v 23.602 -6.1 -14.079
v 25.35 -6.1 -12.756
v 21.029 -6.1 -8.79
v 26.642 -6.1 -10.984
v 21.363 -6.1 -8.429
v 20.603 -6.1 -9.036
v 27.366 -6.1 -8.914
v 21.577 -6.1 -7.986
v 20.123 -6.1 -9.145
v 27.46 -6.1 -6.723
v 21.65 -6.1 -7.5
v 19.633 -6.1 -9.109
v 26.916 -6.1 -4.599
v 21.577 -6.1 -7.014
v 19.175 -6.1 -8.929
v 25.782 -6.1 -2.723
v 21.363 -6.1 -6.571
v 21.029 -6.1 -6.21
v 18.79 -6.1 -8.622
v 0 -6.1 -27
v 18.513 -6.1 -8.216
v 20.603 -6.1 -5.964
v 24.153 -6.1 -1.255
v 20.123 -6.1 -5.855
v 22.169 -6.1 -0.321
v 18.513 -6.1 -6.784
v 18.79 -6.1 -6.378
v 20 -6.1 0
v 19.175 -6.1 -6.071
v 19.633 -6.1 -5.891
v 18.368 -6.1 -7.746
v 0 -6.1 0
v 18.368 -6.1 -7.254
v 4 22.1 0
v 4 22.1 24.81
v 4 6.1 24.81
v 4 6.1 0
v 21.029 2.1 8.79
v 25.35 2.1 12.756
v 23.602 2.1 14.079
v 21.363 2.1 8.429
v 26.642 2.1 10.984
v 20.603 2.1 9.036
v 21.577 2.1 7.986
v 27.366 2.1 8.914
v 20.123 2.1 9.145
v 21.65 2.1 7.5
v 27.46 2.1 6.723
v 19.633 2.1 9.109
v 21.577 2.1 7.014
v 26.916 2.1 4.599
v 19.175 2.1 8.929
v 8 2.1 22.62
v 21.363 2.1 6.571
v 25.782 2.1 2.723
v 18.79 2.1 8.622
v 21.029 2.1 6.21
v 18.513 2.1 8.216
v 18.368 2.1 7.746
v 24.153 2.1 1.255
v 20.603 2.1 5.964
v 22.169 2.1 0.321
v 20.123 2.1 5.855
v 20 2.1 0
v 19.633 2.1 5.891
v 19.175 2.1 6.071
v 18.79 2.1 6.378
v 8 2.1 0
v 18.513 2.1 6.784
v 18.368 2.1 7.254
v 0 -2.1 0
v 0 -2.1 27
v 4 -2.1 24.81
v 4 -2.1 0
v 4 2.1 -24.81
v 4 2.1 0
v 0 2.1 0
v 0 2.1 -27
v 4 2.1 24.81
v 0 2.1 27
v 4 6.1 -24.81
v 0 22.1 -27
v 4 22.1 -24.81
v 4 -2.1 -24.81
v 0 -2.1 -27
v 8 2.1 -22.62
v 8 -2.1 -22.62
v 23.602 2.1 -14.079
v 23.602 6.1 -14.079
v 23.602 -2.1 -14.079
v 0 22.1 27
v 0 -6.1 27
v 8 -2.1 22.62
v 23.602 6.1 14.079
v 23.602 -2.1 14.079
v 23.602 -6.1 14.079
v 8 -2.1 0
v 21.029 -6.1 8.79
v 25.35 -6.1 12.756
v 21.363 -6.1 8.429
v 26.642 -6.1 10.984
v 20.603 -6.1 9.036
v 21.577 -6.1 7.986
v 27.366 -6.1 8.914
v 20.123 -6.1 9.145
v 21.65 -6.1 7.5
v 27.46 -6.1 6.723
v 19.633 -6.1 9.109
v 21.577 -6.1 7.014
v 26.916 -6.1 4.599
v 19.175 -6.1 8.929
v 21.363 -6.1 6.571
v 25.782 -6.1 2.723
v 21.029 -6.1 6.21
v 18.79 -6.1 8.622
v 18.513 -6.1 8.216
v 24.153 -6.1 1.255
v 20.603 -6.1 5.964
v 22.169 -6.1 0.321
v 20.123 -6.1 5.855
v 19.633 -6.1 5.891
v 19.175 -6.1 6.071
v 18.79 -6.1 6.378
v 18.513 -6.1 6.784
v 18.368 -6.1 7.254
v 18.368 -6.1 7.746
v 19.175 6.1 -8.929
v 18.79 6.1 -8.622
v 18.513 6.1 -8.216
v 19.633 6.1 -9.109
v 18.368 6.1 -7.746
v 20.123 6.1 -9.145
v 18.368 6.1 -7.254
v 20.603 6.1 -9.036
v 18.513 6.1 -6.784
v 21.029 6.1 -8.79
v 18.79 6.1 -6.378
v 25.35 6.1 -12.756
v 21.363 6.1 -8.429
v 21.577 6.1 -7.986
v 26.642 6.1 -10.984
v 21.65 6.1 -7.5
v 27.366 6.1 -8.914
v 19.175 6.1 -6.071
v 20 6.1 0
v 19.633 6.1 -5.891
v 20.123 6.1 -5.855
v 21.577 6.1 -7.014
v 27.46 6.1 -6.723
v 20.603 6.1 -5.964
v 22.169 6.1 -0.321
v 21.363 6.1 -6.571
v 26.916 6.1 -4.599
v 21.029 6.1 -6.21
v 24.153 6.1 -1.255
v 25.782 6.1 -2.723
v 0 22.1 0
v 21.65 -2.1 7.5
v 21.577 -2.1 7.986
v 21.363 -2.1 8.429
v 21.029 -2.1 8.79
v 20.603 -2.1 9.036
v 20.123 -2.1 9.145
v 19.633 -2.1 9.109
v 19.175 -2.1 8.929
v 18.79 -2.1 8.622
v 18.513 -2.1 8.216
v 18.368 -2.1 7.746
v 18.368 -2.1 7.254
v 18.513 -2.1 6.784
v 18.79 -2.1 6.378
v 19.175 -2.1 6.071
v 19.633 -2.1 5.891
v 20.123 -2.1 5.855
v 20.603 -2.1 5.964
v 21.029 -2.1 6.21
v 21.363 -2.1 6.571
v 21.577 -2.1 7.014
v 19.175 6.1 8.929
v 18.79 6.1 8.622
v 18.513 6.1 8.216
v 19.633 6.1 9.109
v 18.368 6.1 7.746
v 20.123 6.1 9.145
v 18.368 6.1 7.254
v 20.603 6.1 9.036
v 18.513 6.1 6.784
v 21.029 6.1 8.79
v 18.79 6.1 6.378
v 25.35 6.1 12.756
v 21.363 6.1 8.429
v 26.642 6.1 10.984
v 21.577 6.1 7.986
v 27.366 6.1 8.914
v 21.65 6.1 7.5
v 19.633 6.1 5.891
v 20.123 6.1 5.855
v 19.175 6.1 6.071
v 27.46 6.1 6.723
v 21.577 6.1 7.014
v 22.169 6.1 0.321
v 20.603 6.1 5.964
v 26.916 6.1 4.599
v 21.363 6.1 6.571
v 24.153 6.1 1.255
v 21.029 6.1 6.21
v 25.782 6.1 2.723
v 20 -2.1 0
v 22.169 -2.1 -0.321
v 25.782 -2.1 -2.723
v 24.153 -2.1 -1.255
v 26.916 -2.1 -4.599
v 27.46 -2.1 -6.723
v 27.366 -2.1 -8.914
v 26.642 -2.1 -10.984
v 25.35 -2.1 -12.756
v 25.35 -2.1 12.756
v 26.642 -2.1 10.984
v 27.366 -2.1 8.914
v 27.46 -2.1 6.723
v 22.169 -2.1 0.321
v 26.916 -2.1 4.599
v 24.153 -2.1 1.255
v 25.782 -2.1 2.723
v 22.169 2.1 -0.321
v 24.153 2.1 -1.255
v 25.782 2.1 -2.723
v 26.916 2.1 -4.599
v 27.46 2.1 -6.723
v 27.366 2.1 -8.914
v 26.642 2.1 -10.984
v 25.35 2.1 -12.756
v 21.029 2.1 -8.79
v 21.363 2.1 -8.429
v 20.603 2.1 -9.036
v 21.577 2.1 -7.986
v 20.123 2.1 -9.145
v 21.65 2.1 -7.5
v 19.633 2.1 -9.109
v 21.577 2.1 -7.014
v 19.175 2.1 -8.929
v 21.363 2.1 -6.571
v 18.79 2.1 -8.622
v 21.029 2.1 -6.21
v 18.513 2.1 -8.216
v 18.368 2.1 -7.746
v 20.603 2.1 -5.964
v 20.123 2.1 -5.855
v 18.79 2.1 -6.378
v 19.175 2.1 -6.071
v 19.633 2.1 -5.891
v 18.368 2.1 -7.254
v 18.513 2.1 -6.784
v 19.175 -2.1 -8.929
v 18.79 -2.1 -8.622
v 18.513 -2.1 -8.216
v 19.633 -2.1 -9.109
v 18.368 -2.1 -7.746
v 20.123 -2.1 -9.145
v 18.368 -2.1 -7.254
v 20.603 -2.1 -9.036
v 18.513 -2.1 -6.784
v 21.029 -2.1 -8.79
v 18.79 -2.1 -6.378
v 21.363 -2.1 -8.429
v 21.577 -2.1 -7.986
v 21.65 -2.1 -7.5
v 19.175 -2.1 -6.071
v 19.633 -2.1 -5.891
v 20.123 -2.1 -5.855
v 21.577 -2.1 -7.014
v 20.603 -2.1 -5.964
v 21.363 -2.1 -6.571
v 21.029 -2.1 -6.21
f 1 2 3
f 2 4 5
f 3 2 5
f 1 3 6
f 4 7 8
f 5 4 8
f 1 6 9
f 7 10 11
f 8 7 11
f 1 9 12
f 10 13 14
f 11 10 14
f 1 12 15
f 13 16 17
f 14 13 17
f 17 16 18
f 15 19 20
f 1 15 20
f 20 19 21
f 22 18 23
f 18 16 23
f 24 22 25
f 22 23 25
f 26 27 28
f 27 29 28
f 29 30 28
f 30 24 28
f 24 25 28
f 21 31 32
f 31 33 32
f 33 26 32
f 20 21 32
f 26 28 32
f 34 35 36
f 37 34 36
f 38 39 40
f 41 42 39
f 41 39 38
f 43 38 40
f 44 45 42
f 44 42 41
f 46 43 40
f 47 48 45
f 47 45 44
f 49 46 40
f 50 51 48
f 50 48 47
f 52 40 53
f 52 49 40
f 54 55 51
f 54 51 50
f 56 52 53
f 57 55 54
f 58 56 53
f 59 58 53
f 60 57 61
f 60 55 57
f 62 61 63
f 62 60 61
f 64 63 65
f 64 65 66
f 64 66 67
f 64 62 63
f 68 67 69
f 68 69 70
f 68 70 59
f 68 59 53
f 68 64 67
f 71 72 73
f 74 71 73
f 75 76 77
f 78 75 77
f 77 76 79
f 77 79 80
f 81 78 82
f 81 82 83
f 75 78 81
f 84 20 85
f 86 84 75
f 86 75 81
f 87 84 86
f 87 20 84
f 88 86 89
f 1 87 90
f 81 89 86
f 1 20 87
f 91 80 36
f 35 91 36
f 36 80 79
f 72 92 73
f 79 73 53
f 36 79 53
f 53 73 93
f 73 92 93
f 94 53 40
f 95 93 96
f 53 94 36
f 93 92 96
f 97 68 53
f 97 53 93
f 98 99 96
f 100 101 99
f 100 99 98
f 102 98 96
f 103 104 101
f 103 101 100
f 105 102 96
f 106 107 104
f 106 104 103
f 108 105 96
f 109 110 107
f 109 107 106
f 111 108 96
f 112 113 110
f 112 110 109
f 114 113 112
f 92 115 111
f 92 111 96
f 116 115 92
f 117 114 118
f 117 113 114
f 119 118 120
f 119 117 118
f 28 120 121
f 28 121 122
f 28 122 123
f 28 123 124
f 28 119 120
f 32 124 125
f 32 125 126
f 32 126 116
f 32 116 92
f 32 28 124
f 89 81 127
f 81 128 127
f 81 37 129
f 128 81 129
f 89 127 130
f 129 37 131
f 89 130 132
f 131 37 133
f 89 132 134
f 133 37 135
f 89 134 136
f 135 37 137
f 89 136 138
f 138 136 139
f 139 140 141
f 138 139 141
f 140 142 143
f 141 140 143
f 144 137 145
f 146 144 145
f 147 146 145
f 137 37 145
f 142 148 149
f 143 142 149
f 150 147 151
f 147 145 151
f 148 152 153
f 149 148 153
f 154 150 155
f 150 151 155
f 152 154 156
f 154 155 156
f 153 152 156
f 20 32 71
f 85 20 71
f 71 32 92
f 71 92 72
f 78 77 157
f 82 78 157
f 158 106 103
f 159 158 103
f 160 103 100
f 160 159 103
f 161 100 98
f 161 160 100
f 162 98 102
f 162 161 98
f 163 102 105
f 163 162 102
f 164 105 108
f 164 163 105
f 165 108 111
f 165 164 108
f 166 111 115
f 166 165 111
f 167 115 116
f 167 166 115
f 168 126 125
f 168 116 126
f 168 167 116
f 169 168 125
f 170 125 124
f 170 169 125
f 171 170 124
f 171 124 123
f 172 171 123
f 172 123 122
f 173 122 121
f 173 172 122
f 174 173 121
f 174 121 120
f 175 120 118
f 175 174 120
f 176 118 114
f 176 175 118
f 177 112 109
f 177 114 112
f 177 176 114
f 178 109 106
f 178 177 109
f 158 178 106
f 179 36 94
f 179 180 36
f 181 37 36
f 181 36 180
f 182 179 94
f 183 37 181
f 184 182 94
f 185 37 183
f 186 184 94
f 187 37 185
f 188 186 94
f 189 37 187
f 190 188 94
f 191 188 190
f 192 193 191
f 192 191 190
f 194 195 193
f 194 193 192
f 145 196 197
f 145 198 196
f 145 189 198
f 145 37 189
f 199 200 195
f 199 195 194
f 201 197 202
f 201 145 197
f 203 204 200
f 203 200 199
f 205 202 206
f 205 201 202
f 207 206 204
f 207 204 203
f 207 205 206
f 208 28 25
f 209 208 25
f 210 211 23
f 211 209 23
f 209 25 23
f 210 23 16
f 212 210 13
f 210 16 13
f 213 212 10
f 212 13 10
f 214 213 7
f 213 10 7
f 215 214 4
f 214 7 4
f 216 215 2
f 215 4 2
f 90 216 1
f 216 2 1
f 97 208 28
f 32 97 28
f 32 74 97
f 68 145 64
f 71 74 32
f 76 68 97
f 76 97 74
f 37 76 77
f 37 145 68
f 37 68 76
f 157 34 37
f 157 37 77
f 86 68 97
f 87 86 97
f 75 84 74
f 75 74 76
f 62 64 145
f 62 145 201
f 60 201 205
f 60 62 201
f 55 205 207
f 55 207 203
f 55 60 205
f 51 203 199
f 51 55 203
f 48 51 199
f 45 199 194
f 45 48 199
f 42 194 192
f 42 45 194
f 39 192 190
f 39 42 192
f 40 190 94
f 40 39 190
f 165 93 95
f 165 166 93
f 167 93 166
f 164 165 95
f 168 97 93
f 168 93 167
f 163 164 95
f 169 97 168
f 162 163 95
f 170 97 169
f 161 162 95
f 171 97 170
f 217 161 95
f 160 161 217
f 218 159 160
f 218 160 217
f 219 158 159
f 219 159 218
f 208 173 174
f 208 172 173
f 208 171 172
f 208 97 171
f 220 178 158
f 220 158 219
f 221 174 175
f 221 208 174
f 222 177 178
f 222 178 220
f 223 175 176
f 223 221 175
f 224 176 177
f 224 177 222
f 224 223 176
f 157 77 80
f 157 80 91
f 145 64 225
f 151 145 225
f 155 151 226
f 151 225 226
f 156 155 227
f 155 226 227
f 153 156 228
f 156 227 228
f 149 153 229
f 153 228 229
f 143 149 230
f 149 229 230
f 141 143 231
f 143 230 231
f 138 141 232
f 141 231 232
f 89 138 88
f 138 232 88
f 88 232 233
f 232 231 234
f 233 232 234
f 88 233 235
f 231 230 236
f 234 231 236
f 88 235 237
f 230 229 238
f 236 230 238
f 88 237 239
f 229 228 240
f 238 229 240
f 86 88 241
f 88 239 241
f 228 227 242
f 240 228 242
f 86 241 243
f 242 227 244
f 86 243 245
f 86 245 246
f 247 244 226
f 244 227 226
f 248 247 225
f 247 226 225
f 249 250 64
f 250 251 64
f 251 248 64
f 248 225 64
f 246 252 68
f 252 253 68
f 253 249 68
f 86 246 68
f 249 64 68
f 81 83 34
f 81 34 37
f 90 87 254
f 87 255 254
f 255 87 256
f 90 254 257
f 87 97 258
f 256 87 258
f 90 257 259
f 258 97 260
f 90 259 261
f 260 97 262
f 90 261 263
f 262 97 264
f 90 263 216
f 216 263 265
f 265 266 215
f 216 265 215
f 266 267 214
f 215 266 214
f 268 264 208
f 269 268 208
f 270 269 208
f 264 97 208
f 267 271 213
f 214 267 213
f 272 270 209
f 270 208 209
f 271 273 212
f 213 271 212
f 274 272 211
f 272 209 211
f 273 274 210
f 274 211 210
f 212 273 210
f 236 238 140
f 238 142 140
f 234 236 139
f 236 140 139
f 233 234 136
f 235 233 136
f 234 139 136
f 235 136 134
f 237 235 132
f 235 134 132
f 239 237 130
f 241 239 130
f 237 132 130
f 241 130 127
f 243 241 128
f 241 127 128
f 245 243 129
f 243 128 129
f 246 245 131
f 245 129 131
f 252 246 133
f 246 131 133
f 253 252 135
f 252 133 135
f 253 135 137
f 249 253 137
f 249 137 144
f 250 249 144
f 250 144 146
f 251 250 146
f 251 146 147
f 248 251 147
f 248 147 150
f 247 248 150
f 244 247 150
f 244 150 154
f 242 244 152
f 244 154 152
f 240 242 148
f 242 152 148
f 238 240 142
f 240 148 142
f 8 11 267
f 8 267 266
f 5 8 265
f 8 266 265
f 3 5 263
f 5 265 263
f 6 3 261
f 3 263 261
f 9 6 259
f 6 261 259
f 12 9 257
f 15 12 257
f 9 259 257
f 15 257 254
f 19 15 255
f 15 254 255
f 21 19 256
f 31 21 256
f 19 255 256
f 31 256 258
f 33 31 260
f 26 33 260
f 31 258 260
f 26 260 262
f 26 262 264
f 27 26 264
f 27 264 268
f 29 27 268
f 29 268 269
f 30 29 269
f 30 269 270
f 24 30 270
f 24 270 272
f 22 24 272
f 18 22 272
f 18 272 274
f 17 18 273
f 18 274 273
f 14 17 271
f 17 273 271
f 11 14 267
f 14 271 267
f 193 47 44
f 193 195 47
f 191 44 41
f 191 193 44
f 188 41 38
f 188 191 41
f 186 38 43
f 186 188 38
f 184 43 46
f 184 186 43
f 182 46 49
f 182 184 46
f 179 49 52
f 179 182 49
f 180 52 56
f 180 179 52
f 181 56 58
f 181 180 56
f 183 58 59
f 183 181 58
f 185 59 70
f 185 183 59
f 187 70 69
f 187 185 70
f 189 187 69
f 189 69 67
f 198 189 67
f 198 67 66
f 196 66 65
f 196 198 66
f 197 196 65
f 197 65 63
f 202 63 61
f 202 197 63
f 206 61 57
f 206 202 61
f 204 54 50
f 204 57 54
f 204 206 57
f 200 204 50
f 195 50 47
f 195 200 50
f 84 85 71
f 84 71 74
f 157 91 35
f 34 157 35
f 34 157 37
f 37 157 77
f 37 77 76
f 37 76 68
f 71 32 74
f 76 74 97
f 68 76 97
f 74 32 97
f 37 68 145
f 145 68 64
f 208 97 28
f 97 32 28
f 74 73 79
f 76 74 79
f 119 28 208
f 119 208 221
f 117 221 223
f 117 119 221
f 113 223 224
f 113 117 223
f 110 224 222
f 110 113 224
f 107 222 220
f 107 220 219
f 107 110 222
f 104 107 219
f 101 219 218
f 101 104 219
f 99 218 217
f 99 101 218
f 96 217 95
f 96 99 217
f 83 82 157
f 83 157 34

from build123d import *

# Parameters (mm, degrees)
SKETCH001_R   = 1.65
EXTRUDE_DEPTH = 40
PAD_DEPTH     = 27


with BuildPart() as extrude_body:
    # Sketch001 → Extrude (new body, symmetric)
    with BuildSketch(Plane.XZ):
        with BuildLine():
            ThreePointArc((20, 0), (27.266003, 5.641182), (23.601647, 14.078612))
            Line((0, 27), (23.601647, 14.078612))
            Line((0, 0), (0, 27))
            Line((0, 0), (20, 0))
        make_face()
        with Locations((20, 7.5)):
            Circle(SKETCH001_R, mode=Mode.SUBTRACT)
    extrude(amount=EXTRUDE_DEPTH, both=True)


with BuildPart() as body:
    # Sketch → Pad (new body)
    with BuildSketch(Plane.XY):
        Polygon((0, 22.1), (4, 22.1), (4, 6.1), (27.5, 6.1), (27.5, 2.1), (8, 2.1), (8, -2.1), (27.5, -2.1), (27.5, -6.1), (0, -6.1), (0, -2.1), (4, -2.1), (4, 2.1), (0, 2.1), align=None)
    extrude(amount=PAD_DEPTH)


with BuildPart() as common:
    # Common base: copy of Body
    add(body.part)

    # Common: intersect Extrude body
    add(extrude_body.part, mode=Mode.INTERSECT)


with BuildPart() as part_mirroring:
    # Part__Mirroring: instance of Body
    add(body.part.mirror(Plane(origin=(0, 0, 0), x_dir=(0, 1, 0), z_dir=(0, 0, 1))))


with BuildPart() as common001:
    # Part__Mirroring001: instance of Extrude body
    add(extrude_body.part.mirror(Plane(origin=(0, 0, 0), x_dir=(0, 1, 0), z_dir=(0, 0, 1))))

    # Common001: intersect Part__Mirroring
    add(part_mirroring.part, mode=Mode.INTERSECT)


solid = Compound([common.part, common001.part])
